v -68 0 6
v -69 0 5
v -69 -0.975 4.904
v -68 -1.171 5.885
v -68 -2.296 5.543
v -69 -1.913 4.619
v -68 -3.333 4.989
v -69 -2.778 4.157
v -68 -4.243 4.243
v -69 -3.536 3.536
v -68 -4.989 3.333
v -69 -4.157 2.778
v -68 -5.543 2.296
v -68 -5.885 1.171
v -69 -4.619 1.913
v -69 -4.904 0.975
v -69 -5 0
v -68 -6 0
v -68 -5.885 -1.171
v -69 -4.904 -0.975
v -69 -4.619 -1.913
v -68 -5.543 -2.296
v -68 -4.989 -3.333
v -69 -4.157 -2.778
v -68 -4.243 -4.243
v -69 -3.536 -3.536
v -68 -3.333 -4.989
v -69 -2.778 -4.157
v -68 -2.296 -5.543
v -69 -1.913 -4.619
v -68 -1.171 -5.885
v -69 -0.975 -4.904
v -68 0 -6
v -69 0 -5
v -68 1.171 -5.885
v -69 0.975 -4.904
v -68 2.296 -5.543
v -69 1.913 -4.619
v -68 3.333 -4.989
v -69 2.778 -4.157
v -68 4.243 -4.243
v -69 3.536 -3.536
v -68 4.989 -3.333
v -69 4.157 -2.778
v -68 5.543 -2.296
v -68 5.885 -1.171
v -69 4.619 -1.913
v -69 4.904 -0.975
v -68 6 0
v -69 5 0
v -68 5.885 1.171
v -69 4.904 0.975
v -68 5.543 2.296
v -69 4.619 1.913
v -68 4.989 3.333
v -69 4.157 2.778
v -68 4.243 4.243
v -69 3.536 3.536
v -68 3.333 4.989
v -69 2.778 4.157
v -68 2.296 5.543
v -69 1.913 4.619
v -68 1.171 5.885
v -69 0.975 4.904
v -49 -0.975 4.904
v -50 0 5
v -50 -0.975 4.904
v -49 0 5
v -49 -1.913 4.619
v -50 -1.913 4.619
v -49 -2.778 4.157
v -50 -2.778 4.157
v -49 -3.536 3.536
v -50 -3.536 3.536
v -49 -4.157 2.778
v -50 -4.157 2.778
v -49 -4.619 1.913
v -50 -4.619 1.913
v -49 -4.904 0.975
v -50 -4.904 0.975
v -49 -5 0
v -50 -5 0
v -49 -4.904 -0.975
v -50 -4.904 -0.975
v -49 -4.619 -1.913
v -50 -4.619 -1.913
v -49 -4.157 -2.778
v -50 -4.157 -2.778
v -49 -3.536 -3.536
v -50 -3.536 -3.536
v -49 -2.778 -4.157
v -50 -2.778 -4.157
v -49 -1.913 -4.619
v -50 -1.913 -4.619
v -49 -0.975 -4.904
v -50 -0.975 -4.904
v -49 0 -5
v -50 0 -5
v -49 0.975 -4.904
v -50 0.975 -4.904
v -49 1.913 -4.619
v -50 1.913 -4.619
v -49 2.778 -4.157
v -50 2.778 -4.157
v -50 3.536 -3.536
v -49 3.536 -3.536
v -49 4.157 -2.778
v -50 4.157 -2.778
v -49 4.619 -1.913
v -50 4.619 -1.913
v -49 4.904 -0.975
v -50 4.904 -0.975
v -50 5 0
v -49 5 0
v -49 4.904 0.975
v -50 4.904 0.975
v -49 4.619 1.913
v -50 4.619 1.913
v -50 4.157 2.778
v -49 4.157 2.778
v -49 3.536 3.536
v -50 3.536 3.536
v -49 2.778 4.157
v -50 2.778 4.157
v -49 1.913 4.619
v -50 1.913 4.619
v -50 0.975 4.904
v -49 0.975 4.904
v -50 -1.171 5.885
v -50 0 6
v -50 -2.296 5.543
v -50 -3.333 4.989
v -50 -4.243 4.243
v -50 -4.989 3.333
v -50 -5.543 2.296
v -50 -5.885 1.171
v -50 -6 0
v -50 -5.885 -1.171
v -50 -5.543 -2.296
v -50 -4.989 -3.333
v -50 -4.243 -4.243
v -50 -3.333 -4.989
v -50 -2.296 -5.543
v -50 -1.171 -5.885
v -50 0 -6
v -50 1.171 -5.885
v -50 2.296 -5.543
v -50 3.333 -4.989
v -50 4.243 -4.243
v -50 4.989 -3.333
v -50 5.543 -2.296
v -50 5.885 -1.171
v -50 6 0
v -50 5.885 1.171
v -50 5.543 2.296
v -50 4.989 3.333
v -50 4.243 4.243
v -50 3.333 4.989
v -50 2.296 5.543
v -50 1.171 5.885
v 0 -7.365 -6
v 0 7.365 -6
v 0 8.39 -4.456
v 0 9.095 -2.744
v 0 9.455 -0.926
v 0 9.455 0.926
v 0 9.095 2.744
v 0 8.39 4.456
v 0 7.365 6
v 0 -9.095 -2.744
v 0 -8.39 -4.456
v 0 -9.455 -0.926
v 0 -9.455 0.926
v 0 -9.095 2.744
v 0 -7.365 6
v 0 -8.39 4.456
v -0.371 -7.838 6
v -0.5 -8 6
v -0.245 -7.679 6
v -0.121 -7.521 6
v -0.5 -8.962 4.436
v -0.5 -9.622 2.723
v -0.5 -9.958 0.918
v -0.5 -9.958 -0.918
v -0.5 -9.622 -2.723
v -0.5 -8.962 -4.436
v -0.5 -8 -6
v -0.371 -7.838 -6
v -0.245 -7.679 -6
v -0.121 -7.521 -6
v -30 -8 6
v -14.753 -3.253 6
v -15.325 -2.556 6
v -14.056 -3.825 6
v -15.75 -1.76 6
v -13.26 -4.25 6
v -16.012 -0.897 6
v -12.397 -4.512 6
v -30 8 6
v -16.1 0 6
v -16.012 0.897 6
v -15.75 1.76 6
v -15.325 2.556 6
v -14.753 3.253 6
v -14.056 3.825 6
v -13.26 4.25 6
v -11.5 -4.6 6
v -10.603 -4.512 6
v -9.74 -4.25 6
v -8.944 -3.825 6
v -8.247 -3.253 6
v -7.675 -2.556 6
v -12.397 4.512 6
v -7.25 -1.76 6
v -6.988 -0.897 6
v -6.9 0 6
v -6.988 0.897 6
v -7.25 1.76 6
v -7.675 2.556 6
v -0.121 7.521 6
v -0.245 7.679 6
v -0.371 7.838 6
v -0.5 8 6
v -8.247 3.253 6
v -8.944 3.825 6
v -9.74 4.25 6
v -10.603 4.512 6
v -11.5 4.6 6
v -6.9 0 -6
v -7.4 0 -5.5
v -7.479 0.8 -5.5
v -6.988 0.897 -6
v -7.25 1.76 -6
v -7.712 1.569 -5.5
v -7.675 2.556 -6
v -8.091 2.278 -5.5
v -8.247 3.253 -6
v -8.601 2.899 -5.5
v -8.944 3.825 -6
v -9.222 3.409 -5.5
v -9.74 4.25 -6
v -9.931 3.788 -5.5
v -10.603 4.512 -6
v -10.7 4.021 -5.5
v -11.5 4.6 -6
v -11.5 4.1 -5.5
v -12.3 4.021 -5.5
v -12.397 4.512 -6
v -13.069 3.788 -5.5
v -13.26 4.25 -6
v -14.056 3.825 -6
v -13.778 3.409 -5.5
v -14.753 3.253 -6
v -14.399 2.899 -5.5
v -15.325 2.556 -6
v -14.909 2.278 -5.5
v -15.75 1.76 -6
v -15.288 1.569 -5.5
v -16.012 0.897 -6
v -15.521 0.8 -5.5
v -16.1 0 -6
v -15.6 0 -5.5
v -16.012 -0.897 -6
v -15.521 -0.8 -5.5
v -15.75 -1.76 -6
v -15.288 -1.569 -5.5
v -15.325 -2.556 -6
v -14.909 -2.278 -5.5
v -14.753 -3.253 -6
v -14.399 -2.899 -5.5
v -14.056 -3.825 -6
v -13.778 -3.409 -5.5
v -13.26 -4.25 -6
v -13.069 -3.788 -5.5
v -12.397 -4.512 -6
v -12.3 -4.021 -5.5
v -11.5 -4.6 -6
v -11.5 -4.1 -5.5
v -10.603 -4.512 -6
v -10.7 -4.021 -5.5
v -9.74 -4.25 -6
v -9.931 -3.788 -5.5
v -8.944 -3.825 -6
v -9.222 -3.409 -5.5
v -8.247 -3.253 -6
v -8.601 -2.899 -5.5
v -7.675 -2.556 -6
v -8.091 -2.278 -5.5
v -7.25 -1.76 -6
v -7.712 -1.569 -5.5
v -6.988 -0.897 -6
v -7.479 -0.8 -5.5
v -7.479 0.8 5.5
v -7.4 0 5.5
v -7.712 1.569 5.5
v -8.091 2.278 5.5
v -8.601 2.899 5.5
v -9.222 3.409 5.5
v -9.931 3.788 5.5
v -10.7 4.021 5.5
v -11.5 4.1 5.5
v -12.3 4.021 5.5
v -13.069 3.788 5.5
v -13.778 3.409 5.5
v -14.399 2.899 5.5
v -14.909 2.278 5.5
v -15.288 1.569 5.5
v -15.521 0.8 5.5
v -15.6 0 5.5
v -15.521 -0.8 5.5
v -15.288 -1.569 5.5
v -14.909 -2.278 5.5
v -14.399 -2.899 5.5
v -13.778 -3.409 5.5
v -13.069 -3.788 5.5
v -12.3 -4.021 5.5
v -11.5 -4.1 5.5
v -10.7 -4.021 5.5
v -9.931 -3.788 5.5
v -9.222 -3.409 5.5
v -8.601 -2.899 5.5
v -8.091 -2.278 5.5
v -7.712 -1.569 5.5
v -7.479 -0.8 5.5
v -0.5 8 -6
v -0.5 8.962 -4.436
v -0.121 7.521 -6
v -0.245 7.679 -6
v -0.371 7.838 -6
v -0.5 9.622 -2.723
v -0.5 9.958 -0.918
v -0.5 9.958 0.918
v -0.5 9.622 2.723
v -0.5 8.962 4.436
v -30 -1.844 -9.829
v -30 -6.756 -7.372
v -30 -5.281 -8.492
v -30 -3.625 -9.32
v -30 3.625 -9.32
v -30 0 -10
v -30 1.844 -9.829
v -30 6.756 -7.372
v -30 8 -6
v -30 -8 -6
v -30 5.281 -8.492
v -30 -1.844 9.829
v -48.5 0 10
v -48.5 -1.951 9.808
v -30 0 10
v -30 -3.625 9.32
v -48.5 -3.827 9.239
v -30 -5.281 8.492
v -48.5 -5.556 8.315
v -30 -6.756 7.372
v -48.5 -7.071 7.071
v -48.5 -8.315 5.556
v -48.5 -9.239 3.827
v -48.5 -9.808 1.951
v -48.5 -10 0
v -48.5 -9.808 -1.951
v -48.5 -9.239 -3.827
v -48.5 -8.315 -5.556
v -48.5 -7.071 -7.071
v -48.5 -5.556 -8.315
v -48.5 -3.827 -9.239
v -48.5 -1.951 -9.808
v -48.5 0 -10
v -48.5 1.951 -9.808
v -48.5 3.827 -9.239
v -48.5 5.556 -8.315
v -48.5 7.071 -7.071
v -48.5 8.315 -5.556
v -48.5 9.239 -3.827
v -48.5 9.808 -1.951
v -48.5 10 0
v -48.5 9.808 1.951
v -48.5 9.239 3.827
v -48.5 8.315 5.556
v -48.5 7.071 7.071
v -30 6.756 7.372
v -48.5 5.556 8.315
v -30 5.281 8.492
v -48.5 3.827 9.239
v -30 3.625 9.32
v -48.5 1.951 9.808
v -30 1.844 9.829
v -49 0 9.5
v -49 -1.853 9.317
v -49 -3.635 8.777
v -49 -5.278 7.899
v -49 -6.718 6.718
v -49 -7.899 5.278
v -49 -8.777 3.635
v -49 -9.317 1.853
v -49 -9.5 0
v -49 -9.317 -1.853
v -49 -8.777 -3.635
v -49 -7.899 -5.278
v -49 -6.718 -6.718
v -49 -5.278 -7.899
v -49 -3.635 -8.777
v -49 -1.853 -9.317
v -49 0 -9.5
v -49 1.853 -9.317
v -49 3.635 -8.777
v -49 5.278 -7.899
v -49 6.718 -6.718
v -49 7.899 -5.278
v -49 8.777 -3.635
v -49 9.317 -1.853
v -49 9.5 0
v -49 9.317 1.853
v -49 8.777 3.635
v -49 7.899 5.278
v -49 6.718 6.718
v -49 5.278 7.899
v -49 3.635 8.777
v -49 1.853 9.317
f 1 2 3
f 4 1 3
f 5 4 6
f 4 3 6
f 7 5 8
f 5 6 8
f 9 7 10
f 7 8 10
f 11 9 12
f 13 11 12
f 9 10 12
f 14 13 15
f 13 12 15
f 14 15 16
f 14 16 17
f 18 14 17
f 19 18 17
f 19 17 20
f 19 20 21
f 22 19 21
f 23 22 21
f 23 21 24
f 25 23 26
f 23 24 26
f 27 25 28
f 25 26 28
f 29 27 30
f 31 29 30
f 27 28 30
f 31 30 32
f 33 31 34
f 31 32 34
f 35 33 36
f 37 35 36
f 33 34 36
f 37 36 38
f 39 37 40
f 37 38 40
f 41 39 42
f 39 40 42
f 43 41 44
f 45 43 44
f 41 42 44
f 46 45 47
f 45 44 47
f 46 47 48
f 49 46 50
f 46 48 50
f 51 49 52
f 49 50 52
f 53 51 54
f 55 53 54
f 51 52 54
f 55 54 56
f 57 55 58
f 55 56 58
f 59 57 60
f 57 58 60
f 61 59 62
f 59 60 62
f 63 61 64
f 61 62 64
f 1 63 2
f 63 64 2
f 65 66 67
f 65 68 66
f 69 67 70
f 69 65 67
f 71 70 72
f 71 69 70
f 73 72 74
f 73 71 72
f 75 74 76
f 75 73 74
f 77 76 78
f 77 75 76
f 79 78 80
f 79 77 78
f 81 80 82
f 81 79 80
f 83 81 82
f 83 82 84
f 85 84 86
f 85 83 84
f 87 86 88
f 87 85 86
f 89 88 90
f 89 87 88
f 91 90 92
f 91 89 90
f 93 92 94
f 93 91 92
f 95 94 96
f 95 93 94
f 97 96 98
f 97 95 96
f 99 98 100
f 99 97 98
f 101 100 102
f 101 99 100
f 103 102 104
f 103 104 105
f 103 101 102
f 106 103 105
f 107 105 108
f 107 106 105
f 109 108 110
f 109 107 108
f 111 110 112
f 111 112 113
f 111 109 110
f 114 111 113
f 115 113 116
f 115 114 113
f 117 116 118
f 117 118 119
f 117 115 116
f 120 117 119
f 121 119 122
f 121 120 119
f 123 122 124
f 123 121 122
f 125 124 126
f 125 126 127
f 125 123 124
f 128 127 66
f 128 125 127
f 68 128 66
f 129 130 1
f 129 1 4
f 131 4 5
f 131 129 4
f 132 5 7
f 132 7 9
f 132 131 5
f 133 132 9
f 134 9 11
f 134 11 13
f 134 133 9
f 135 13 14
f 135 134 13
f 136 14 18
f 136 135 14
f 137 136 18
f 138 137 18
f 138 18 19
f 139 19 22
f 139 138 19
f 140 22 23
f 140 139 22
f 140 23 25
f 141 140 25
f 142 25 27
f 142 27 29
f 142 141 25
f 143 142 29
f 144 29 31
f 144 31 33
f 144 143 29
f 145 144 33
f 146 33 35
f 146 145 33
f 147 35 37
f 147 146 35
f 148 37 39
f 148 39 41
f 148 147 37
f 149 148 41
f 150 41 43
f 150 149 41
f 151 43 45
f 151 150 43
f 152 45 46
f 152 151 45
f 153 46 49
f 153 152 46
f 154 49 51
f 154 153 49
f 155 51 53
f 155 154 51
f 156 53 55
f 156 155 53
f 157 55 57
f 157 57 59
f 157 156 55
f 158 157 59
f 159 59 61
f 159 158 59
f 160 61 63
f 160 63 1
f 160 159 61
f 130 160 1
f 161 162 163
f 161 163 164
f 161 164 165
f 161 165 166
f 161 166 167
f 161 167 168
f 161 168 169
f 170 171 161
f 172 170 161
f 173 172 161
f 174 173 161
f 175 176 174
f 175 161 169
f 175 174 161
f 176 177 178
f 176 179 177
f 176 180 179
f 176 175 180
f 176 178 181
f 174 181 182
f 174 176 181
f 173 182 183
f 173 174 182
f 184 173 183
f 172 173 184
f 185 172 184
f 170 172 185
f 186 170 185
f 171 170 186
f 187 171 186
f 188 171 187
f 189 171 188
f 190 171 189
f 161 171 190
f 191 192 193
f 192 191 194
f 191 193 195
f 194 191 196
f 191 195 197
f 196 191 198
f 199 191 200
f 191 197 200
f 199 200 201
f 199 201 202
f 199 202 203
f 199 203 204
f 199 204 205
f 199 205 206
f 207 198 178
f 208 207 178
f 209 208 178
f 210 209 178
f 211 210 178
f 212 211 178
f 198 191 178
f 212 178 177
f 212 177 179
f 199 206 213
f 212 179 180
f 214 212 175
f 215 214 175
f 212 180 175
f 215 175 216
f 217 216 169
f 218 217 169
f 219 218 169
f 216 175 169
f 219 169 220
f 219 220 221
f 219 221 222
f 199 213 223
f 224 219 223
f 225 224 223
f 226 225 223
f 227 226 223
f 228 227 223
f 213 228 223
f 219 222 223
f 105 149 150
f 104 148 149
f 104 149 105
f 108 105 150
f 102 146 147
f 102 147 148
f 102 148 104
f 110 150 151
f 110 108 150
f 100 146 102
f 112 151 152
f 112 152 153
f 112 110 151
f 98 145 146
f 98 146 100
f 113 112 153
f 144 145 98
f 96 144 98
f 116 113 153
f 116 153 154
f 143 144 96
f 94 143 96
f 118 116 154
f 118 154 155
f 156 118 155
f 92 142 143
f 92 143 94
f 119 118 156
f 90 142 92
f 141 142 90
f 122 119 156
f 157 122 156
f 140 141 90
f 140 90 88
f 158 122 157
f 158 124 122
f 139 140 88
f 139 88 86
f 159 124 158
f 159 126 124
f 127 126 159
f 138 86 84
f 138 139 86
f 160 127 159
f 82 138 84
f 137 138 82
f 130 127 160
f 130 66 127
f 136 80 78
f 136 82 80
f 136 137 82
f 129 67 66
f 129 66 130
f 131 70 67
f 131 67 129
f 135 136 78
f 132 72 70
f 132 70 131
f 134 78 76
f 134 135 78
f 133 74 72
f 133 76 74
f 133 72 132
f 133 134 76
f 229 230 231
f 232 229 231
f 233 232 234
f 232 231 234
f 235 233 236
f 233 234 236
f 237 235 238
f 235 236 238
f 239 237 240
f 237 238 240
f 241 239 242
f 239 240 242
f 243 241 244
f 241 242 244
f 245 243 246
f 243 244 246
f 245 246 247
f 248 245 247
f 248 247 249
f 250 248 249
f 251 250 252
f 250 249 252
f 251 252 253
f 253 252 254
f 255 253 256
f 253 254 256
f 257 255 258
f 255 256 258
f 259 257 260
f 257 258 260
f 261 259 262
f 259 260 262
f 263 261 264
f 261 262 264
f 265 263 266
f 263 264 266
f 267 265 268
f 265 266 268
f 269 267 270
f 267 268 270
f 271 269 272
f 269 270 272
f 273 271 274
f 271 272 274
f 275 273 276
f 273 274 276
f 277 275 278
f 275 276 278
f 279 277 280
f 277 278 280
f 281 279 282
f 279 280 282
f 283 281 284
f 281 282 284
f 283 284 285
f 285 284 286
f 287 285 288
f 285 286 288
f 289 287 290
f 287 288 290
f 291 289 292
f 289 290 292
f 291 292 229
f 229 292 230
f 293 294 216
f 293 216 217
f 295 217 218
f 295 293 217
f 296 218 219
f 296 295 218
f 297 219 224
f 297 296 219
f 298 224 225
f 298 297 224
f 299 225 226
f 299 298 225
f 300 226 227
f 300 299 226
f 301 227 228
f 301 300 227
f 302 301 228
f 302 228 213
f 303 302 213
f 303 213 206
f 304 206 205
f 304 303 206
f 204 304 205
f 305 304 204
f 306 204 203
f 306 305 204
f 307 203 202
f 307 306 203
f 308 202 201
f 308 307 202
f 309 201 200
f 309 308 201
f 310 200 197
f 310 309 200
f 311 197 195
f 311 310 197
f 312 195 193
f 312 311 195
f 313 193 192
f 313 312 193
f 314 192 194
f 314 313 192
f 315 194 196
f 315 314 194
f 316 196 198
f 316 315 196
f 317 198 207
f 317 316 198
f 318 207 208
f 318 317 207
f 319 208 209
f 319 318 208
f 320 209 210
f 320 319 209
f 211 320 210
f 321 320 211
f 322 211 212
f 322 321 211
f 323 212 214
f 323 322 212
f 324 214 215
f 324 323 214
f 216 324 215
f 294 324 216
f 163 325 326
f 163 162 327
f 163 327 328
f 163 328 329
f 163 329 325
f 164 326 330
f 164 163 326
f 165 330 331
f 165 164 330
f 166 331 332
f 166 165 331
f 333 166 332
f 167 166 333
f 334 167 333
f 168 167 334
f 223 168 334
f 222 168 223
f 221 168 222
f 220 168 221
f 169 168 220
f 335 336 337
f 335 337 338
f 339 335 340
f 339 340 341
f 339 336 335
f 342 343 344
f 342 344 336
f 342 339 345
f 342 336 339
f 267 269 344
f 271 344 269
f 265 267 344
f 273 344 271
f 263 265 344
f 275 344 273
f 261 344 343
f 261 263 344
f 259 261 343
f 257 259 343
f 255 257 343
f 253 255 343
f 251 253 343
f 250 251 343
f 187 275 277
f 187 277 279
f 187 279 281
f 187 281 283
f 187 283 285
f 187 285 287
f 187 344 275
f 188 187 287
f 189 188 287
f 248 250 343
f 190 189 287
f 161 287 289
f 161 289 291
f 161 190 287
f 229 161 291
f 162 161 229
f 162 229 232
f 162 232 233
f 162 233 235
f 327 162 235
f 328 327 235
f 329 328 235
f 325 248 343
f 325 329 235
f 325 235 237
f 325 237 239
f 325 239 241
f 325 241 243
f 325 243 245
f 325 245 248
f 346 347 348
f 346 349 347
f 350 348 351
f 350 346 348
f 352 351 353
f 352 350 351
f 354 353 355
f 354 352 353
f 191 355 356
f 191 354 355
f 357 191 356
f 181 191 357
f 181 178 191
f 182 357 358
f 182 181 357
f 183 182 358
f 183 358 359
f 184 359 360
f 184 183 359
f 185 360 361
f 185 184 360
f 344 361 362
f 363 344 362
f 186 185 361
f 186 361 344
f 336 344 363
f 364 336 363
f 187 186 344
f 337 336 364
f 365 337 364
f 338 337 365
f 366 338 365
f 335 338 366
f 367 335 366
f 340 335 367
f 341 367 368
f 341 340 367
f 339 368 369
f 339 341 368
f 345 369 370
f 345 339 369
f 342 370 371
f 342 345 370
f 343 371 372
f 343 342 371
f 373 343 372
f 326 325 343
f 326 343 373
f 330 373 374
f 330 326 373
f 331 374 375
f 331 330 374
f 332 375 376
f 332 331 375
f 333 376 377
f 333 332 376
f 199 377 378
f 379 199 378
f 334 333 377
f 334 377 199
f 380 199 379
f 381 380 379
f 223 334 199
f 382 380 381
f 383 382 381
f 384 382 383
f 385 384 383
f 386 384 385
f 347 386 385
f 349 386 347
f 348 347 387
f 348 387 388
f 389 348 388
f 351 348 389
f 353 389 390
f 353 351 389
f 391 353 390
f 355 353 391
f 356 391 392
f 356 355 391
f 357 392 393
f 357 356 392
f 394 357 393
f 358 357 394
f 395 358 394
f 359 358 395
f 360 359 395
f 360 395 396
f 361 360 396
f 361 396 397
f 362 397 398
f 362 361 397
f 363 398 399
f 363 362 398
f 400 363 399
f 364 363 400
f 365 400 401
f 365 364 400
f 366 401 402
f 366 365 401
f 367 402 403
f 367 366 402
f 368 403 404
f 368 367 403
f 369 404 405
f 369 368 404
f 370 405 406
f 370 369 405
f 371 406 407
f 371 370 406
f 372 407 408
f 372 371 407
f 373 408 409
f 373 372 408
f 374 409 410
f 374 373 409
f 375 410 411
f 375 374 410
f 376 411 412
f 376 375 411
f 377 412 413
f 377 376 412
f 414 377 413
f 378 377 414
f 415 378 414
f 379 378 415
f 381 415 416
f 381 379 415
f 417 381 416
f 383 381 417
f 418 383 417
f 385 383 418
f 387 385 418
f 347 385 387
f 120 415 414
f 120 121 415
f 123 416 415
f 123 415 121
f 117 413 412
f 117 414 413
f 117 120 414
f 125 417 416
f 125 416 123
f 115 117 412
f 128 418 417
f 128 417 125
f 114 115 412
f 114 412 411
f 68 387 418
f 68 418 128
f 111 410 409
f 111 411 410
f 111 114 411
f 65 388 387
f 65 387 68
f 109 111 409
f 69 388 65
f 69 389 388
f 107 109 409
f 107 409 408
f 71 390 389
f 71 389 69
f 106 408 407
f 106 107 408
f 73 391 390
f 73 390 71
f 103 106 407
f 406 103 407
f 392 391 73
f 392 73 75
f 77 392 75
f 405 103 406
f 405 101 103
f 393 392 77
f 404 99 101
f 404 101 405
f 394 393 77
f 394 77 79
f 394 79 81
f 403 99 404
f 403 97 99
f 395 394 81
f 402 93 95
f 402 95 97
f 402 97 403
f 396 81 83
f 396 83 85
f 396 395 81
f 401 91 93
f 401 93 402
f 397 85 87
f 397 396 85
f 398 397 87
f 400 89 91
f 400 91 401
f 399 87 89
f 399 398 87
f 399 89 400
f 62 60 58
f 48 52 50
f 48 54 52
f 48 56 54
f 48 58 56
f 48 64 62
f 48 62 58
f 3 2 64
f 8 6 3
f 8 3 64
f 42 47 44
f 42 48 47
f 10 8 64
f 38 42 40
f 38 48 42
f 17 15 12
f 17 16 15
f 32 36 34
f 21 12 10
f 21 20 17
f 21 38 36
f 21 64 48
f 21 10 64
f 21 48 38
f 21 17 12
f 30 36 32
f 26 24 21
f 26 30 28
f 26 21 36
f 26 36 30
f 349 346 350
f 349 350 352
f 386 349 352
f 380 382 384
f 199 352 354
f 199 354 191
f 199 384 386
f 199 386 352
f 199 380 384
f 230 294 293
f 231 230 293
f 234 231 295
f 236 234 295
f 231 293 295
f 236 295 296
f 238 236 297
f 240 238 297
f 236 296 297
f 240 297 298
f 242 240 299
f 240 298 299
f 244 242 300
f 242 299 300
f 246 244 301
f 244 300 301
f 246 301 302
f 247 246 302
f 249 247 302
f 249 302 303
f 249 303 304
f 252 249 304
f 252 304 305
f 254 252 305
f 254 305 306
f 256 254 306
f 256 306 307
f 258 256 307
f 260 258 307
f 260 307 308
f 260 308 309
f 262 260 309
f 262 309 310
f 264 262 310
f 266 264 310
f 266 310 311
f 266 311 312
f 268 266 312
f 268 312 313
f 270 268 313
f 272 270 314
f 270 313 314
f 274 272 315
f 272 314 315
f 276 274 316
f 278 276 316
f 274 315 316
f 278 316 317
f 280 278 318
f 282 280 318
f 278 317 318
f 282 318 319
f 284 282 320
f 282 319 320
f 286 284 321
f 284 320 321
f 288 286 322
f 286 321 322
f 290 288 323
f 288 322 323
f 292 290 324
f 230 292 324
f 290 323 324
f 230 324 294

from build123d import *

# Parameters (mm, degrees)
CHANFREIN1_SIZE         = 0.5
CHANFREIN2_SIZE         = 1
ESQUISSE2_W             = 9
ESQUISSE2_H             = 30
ENL_V_MAT_EXTRU_1_DEPTH = 30
ENL_V_MAT_EXTRU_2_REACH = 73.533
ESQUISSE3_R             = 4.1
CHANFREIN3_SIZE         = 0.5


with BuildPart() as part:
    # Esquisse1 → Révolution1 (revolve)
    with BuildSketch(Plane.XY, mode=Mode.PRIVATE) as r_volution1_sk:
        Polygon((-49, 5), (-49, 10), (0, 10), (0, 0), (-69, 0), (-69, 6), (-50, 6), (-50, 5), align=None)
    revolve(r_volution1_sk.sketch.rotate(Axis((0, 0, 0), (1, 0, 0)), 90), axis=Axis((0, 0, 0), (1, 0, 0)))

    # Chanfrein1
    chanfrein1_edges = [part.edges().sort_by_distance(p)[0] for p in [
        (-49, 0, -10),
        (0, 0, -10),
    ]]
    chamfer(chanfrein1_edges, length=CHANFREIN1_SIZE)

    # Chanfrein2
    chanfrein2_edges = [part.edges().sort_by_distance(p)[0] for p in [
        (-69, 0, -6),
    ]]
    chamfer(chanfrein2_edges, length=CHANFREIN2_SIZE)

    # Esquisse2 → Enlèv. mat.-Extru.1 (cut)
    with BuildSketch(Plane(origin=(0, 0, 0), x_dir=(0, 0, -1), z_dir=(1, 0, 0))):
        with Locations((-10.5, 0)):
            Rectangle(ESQUISSE2_W, ESQUISSE2_H)
        with Locations((10.5, 0)):
            Rectangle(ESQUISSE2_W, ESQUISSE2_H)
    extrude(amount=-ENL_V_MAT_EXTRU_1_DEPTH, mode=Mode.SUBTRACT)

    # Esquisse3 → Enlèv. mat.-Extru.2 (cut, up to next)
    with BuildSketch(Plane.XY.offset(6), mode=Mode.PRIVATE) as enl_v_mat_extru_2_sk1:
        with Locations((-11.5, 0)):
            Circle(ESQUISSE3_R)
    enl_v_mat_extru_2_tool1 = extrude(enl_v_mat_extru_2_sk1.sketch, amount=-ENL_V_MAT_EXTRU_2_REACH, mode=Mode.PRIVATE) & part.part
    add(enl_v_mat_extru_2_tool1.solids().sort_by_distance((-11.5, 0, 6))[0], mode=Mode.SUBTRACT)

    # Chanfrein3
    chanfrein3_edges = [part.edges().sort_by_distance(p)[0] for p in [
        (-15.6, 0, 6),
        (-15.6, 0, -6),
    ]]
    chamfer(chanfrein3_edges, length=CHANFREIN3_SIZE)


solid = part.part
